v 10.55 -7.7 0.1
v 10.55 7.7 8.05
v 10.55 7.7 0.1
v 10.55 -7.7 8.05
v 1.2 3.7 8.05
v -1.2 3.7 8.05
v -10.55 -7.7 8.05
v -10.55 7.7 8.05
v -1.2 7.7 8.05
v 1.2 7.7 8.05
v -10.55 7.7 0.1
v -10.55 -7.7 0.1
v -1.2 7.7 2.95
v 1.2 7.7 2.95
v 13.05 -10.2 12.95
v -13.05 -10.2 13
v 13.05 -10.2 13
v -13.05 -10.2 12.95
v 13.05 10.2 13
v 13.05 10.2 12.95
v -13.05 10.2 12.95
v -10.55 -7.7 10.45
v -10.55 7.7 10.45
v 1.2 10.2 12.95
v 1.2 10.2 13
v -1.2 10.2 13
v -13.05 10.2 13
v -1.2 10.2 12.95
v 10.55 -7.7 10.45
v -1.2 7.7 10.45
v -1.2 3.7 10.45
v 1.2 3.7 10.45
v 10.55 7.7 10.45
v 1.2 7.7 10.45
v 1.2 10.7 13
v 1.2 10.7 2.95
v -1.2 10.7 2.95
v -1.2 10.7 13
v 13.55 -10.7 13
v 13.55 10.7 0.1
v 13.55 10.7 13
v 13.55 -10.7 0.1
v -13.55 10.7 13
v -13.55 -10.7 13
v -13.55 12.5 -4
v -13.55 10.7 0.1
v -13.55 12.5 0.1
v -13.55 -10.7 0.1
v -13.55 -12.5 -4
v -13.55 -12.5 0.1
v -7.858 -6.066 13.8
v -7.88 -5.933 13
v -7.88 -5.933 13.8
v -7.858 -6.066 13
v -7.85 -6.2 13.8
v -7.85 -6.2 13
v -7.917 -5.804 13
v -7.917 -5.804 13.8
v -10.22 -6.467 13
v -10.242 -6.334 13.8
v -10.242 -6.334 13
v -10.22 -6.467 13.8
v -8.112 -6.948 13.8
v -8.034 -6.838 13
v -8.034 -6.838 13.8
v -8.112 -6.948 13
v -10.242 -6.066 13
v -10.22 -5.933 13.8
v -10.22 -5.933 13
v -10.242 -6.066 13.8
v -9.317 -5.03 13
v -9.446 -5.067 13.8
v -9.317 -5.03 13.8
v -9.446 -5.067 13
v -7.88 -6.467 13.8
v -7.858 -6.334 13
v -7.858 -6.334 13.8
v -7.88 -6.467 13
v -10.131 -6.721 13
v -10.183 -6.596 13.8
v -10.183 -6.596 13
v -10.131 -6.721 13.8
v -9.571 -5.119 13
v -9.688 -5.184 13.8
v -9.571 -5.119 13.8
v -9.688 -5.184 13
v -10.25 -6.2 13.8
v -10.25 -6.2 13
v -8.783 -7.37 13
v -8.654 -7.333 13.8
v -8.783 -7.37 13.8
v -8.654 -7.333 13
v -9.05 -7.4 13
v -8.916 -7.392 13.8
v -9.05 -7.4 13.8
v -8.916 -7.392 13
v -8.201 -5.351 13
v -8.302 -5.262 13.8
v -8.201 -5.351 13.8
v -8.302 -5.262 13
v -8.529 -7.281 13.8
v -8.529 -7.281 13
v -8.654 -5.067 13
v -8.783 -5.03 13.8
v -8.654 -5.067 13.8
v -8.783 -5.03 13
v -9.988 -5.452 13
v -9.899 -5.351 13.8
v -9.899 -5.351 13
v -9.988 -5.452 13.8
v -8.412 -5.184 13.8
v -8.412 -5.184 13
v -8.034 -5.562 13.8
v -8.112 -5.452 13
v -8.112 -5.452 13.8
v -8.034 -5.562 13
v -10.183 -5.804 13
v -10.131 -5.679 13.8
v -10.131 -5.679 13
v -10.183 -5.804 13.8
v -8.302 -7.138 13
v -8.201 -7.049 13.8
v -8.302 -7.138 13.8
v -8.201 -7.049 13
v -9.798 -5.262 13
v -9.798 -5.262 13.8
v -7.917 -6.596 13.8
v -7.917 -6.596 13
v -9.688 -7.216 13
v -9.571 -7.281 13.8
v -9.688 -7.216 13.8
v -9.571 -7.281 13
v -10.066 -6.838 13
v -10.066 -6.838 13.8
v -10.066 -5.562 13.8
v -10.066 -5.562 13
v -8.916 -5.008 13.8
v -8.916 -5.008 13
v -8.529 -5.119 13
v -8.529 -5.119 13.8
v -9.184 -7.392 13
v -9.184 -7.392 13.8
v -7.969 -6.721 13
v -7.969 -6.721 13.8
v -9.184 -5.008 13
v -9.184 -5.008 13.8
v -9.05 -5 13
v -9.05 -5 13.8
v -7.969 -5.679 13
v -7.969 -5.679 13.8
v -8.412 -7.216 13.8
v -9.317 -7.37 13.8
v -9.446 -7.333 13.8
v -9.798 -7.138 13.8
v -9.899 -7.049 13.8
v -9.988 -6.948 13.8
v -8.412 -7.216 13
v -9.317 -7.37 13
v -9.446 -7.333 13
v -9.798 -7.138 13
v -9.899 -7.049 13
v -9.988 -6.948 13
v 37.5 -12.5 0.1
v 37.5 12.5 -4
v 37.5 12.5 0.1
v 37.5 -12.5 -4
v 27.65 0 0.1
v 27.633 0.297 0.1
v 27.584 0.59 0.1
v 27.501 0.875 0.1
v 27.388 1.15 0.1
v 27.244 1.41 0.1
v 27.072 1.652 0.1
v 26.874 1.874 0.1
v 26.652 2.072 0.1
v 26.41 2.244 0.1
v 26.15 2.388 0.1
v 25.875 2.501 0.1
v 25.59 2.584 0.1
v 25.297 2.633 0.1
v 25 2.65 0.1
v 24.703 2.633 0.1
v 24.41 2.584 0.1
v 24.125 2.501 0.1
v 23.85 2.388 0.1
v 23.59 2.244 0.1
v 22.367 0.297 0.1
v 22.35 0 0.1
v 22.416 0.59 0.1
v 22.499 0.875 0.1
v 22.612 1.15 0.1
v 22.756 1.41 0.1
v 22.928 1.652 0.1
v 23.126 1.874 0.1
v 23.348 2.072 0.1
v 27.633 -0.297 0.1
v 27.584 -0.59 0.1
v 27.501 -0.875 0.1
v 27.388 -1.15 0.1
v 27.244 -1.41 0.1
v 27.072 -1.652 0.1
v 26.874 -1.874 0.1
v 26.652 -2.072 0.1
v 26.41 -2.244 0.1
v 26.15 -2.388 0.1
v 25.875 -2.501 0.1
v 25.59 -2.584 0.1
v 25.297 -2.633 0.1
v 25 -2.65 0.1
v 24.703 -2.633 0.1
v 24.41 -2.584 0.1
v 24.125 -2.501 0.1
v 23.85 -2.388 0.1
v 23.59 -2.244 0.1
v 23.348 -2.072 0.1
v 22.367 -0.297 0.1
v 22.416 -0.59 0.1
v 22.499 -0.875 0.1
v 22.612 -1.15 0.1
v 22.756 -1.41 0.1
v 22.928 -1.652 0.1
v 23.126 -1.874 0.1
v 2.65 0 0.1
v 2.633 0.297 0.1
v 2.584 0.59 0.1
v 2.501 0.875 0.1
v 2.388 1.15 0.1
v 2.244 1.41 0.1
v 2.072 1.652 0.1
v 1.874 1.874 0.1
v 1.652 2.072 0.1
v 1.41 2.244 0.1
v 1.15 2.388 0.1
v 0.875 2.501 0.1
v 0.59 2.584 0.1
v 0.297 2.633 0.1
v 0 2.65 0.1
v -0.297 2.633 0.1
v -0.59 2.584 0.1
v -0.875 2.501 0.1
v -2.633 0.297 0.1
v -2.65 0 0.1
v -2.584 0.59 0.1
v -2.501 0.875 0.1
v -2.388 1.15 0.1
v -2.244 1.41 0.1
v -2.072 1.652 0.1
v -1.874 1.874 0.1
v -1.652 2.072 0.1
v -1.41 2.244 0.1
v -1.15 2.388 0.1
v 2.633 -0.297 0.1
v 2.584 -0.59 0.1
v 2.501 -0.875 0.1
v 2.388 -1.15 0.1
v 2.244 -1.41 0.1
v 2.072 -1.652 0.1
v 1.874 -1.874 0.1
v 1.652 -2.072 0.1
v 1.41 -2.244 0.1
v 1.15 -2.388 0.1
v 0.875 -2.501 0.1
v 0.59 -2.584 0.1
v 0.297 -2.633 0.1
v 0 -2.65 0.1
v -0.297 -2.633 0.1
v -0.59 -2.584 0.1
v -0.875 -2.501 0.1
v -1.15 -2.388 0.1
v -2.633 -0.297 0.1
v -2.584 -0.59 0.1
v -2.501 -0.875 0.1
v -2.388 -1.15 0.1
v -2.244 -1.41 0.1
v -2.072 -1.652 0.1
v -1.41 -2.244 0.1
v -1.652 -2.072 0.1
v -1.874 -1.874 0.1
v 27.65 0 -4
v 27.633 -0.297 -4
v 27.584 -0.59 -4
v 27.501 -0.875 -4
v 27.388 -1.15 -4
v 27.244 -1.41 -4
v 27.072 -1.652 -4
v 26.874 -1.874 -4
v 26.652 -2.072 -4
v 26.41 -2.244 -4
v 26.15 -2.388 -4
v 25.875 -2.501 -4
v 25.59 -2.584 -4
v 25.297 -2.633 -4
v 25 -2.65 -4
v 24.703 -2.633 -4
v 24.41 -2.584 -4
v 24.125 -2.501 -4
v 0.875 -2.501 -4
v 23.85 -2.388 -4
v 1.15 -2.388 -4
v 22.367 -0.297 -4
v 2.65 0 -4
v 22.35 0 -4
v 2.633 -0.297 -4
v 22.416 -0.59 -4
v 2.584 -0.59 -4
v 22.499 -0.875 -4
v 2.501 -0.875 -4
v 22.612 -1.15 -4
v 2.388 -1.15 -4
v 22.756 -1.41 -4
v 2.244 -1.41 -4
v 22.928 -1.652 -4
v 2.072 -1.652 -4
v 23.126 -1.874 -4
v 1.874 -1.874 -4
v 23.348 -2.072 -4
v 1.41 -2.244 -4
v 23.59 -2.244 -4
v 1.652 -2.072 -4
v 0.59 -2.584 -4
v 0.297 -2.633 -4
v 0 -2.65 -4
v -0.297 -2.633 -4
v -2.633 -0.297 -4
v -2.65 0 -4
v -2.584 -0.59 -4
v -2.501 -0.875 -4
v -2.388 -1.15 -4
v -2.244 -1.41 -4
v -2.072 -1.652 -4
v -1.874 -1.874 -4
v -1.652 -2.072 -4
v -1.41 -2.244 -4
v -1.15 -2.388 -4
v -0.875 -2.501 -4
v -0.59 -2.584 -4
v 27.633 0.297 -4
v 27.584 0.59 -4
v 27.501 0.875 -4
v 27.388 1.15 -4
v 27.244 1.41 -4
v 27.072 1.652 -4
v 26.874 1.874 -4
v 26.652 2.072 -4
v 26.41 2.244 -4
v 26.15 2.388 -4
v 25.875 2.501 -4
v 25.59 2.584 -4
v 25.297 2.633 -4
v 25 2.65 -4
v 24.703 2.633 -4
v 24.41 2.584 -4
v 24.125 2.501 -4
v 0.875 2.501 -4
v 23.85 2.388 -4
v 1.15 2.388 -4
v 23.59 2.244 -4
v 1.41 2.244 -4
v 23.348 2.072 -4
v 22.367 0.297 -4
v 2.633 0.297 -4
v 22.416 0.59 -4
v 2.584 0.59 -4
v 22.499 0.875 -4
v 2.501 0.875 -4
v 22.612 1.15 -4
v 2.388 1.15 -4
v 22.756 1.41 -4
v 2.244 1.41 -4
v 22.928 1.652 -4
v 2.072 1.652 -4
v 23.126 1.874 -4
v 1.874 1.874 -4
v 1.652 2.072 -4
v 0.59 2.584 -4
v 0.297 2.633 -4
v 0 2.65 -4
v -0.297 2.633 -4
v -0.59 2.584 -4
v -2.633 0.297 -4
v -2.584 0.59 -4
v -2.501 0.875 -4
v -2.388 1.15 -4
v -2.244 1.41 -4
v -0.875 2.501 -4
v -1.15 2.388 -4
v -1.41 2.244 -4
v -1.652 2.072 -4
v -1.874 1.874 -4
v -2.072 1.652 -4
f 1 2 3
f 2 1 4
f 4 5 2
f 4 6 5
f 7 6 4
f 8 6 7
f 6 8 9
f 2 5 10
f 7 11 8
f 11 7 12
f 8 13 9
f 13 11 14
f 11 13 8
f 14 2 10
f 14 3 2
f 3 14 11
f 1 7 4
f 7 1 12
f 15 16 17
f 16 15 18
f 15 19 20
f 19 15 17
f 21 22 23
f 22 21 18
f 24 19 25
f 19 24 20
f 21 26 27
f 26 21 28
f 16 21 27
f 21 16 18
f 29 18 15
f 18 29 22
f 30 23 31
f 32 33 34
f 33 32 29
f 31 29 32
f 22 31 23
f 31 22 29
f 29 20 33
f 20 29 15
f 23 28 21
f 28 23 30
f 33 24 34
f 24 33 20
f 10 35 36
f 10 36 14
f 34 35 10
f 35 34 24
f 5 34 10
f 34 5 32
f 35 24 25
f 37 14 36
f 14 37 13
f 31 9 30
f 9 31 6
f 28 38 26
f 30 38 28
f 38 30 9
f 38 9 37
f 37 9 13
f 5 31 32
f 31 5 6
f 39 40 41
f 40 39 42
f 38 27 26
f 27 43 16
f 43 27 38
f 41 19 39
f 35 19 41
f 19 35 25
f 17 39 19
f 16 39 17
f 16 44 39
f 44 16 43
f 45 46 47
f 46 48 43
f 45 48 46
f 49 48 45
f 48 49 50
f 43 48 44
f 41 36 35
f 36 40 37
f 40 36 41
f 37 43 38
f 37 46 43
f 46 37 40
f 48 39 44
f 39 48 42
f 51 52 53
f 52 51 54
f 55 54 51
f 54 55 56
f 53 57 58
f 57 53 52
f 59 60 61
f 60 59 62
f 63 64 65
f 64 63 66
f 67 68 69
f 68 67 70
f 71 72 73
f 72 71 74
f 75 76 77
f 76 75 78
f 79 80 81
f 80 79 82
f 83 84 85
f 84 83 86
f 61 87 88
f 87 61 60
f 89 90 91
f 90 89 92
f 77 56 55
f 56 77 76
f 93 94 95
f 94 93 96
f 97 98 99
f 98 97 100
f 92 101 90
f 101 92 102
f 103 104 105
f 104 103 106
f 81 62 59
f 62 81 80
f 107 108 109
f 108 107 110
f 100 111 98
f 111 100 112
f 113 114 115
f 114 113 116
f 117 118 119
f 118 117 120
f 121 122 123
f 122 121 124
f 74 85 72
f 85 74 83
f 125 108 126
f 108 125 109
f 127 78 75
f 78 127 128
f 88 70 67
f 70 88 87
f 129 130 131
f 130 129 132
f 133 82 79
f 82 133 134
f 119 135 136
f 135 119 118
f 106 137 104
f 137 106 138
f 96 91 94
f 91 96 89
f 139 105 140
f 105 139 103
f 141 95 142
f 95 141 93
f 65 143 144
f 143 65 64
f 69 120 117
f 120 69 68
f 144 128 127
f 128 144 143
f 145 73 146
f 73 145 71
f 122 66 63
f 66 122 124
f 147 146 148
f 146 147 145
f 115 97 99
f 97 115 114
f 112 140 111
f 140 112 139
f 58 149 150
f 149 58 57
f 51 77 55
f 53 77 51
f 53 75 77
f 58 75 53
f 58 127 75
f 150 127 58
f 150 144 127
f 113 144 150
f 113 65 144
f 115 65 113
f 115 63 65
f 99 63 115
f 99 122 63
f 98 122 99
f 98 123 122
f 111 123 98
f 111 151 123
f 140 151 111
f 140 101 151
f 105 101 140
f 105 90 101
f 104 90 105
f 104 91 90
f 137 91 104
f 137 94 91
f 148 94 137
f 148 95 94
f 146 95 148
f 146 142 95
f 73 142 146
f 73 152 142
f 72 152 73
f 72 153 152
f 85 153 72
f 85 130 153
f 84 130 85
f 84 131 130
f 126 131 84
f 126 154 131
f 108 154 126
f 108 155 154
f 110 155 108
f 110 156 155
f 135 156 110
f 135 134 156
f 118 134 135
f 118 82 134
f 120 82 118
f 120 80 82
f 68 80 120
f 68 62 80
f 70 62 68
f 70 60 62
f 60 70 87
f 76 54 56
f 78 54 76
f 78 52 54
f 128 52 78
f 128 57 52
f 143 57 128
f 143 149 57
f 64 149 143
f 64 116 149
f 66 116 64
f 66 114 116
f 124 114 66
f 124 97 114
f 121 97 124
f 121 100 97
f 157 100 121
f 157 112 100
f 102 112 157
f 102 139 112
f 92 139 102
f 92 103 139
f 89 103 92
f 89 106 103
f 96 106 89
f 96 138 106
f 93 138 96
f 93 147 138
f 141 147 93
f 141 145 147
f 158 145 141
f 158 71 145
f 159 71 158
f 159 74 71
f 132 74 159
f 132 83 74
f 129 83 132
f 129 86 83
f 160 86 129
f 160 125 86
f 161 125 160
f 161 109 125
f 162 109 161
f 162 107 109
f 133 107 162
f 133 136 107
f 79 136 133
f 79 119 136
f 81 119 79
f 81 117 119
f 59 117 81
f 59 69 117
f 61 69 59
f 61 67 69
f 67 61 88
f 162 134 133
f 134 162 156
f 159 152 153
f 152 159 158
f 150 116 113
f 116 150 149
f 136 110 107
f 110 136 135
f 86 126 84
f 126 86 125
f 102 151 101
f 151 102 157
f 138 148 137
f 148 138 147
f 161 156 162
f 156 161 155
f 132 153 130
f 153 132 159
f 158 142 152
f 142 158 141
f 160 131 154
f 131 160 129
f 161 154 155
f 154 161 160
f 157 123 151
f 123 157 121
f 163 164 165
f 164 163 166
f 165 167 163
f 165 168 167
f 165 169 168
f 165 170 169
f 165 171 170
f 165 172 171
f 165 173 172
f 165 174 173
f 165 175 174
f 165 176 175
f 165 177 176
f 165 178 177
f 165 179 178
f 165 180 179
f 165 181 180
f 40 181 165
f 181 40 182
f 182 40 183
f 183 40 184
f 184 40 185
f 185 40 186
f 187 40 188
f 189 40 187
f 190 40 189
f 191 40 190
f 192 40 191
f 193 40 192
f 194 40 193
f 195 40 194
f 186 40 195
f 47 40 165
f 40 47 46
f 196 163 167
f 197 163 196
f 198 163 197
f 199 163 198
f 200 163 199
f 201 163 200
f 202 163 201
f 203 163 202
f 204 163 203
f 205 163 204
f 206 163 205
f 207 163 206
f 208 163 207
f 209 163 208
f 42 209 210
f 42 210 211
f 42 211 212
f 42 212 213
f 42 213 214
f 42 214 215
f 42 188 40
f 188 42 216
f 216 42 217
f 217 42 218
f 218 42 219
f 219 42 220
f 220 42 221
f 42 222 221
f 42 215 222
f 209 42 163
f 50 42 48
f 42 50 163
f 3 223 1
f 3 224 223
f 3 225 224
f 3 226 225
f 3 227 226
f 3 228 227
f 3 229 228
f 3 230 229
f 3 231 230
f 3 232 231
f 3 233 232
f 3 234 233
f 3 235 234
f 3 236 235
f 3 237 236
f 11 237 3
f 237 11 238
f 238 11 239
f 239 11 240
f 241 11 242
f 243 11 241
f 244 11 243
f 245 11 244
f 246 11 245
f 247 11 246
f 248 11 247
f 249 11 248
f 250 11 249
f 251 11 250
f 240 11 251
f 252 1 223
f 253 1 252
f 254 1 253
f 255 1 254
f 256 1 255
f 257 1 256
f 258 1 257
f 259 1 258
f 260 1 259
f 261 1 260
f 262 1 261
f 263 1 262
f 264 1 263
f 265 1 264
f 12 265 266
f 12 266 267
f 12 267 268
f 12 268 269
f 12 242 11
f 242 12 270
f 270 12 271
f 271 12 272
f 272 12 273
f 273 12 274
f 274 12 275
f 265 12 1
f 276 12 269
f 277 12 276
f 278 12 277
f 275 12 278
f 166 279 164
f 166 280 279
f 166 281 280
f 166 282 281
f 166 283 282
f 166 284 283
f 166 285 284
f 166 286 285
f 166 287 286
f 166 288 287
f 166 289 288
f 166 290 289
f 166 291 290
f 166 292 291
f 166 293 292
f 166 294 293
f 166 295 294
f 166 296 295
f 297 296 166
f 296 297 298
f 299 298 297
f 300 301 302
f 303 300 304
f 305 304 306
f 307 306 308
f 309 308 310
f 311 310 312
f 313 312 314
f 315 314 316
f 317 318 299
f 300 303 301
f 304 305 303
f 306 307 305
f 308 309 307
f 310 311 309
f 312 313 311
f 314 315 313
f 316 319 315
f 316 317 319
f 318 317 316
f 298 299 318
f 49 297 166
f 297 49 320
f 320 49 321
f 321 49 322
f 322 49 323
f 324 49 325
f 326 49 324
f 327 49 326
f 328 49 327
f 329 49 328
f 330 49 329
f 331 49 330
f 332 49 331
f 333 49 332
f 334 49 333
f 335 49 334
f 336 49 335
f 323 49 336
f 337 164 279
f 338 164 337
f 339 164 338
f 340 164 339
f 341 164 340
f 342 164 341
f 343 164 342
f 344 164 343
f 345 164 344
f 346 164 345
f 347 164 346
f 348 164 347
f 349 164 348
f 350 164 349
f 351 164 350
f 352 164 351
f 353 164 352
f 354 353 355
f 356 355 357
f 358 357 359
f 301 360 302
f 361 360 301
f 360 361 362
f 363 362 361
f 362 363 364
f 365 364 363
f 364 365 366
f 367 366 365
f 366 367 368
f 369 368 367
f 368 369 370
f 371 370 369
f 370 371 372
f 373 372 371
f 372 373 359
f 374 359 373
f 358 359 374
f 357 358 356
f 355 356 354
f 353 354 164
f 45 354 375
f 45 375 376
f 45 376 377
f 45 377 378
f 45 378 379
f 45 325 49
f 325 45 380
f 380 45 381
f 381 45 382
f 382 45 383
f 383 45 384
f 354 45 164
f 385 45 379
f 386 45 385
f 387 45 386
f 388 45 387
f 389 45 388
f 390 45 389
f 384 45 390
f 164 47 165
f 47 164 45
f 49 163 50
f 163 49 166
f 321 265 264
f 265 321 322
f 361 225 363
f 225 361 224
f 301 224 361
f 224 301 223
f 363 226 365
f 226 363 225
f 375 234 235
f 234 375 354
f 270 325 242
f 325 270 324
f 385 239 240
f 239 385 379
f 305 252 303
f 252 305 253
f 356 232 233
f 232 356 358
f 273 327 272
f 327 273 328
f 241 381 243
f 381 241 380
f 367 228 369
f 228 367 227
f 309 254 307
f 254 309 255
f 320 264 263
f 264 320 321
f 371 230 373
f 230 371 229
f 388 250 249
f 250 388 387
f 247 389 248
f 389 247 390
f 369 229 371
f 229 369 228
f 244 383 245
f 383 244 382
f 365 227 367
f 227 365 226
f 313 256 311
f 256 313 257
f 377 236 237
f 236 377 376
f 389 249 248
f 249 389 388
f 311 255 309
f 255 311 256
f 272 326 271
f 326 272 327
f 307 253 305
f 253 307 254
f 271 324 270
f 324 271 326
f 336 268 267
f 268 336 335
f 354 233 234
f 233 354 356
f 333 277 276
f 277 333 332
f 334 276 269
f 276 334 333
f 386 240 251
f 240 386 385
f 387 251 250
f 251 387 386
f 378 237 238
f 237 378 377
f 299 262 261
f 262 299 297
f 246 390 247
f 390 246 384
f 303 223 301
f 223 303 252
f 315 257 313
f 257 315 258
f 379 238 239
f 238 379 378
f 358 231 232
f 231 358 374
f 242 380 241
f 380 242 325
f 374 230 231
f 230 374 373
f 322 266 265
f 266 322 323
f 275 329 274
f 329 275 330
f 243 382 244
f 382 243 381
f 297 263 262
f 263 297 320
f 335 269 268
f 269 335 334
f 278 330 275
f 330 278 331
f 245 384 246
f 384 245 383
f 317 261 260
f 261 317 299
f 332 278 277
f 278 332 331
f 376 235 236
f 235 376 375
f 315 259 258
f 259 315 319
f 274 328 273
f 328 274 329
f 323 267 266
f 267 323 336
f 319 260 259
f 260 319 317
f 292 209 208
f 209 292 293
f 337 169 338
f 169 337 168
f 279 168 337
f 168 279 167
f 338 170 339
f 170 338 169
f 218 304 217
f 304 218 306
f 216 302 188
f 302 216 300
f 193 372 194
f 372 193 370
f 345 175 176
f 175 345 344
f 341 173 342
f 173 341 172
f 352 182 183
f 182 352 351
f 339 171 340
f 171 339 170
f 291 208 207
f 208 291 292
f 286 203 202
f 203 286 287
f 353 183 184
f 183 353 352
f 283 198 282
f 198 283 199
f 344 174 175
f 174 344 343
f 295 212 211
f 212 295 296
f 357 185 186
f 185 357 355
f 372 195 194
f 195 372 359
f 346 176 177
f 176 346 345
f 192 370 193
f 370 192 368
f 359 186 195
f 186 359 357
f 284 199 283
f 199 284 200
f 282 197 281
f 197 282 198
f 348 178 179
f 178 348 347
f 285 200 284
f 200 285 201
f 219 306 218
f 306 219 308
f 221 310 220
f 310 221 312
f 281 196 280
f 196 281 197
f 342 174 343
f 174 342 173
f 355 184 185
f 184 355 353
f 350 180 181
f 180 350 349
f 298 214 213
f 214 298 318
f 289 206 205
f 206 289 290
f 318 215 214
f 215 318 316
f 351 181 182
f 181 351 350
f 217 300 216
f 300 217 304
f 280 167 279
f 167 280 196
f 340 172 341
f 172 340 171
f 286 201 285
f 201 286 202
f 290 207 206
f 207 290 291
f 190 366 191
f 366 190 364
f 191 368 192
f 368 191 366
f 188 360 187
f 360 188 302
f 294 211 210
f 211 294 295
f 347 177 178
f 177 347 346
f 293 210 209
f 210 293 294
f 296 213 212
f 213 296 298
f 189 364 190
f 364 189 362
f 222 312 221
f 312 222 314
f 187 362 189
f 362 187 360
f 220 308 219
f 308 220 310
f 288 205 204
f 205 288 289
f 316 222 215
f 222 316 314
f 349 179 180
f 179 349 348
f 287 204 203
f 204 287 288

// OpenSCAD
// Yaver Connector Nest (rectangular cavity array) — parametric generator
// OpenSCAD. One generator -> a nest for any rectangular-array crimp housing or
// terminal block. docs/yaver-wire-harness-jig-formboard-design.md §C.
//
//   PART = "nest"  -> printable nest (flat gridded baseplate + housing cradle)
//
// Per-harness the compiler emits the parameters below from the connector BOM
// (docs/yaver-harness-compiler-design.md). Design intent baked in:
//   - housing drops into a TOP-opening pocket, captured + keyed (anti-rotation)
//   - the pocket mouth is CHAMFERED -> lead-in that forgives ~+/-0.5mm robot
//     error on the way in (F/T spiral search does the rest)
//   - a BACK-STOP floor under the housing reacts insertion force into the fixture
//   - a flat GRIDDED BASEPLATE on the 25mm M5 pattern connects everything and
//     fixes the nest's pose by construction (no measuring)
//   - a self-fiducial dot (cavity-1 corner) so vision indexes cavities reliably
// Vertical insertion (robot from above). For a tilted presentation, print on a
// wedge spacer or set wedge_deg>0 (adds a wedge under the cradle, baseplate flat).

PART = "nest";
$fn  = 56;
eps  = 0.1;

// ---- cavity array (from the connector datasheet / compiler) ----
cav_rows    = 2;
cav_cols    = 3;
cav_pitch_x = 5.7;       // mm between cavities, X (e.g. Molex Mega-Fit 5.7)
cav_pitch_y = 5.7;       // mm between cavities, Y

// ---- housing capture pocket ----
body_x      = cav_cols*cav_pitch_x + 4;   // housing footprint X (+slop)
body_y      = cav_rows*cav_pitch_y + 4;   // housing footprint Y (+slop)
body_h      = 10;        // capture depth
floor_t     = 3;         // back-stop floor under the housing
chamfer     = 2.5;       // lead-in chamfer at the pocket mouth
key_slot    = [2.4, 4];  // anti-rotation key [w, depth] on +Y wall (w=0 to omit)
wall        = 3;         // cradle wall thickness

// ---- presentation / mounting ----
wedge_deg   = 0;         // >0 tilts the cradle toward the robot (baseplate stays flat)
grid_pitch  = 25;
base_t      = 4;
foot_hole_d = 5.3;       // M5 clearance into the board insert
foot_cells  = [[0,0],[1,0]];   // grid cells this nest spans (compiler-set)

crd_x = body_x + 2*wall;
crd_y = body_y + 2*wall;
crd_h = floor_t + body_h;

function colx(c) = c[0]*grid_pitch;
function coly(c) = c[1]*grid_pitch;
fx = [for (c=foot_cells) colx(c)];
fy = [for (c=foot_cells) coly(c)];
// baseplate bounding box: spans every foot cell AND the cradle footprint
bp_x0 = min(min(fx) - grid_pitch/2, -crd_x/2);
bp_x1 = max(max(fx) + grid_pitch/2,  crd_x/2);
bp_y0 = min(min(fy) - grid_pitch/2, -crd_y/2);
bp_y1 = max(max(fy) + grid_pitch/2,  crd_y/2);

module baseplate() {
  translate([bp_x0, bp_y0, -base_t])
    cube([bp_x1-bp_x0, bp_y1-bp_y0, base_t+eps]);
}

module mount_holes() {
  for (c = foot_cells)
    translate([colx(c), coly(c), -base_t-eps]) cylinder(d=foot_hole_d, h=base_t+2*eps);
}

// upward-opening pocket with a chamfered mouth + optional key slot
module pocket() {
  translate([0,0,floor_t]) {
    cube([body_x, body_y, body_h+eps], center=true);     // straight capture
    // chamfered mouth (frustum widening to the top)
    translate([0,0,body_h-chamfer])
      hull() {
        cube([body_x, body_y, eps], center=true);
        translate([0,0,chamfer]) cube([body_x+2*chamfer, body_y+2*chamfer, eps], center=true);
      }
    if (key_slot[0] > 0)
      translate([0, body_y/2, body_h/2])
        cube([key_slot[0], key_slot[1]*2, body_h+eps], center=true);
  }
}

module cradle() {
  difference() {
    translate([0,0,crd_h/2]) cube([crd_x, crd_y, crd_h], center=true);
    pocket();
  }
  // self-fiducial dot at the cavity-1 corner (vision cavity index)
  translate([-body_x/2+1.5, -body_y/2+1.5, crd_h]) cylinder(d=2.4, h=0.8);
}

module nest() {
  difference() {
    union() {
      baseplate();
      if (wedge_deg > 0)
        rotate([wedge_deg,0,0]) cradle();
      else
        cradle();
    }
    mount_holes();
  }
}

if (PART == "nest") nest();
